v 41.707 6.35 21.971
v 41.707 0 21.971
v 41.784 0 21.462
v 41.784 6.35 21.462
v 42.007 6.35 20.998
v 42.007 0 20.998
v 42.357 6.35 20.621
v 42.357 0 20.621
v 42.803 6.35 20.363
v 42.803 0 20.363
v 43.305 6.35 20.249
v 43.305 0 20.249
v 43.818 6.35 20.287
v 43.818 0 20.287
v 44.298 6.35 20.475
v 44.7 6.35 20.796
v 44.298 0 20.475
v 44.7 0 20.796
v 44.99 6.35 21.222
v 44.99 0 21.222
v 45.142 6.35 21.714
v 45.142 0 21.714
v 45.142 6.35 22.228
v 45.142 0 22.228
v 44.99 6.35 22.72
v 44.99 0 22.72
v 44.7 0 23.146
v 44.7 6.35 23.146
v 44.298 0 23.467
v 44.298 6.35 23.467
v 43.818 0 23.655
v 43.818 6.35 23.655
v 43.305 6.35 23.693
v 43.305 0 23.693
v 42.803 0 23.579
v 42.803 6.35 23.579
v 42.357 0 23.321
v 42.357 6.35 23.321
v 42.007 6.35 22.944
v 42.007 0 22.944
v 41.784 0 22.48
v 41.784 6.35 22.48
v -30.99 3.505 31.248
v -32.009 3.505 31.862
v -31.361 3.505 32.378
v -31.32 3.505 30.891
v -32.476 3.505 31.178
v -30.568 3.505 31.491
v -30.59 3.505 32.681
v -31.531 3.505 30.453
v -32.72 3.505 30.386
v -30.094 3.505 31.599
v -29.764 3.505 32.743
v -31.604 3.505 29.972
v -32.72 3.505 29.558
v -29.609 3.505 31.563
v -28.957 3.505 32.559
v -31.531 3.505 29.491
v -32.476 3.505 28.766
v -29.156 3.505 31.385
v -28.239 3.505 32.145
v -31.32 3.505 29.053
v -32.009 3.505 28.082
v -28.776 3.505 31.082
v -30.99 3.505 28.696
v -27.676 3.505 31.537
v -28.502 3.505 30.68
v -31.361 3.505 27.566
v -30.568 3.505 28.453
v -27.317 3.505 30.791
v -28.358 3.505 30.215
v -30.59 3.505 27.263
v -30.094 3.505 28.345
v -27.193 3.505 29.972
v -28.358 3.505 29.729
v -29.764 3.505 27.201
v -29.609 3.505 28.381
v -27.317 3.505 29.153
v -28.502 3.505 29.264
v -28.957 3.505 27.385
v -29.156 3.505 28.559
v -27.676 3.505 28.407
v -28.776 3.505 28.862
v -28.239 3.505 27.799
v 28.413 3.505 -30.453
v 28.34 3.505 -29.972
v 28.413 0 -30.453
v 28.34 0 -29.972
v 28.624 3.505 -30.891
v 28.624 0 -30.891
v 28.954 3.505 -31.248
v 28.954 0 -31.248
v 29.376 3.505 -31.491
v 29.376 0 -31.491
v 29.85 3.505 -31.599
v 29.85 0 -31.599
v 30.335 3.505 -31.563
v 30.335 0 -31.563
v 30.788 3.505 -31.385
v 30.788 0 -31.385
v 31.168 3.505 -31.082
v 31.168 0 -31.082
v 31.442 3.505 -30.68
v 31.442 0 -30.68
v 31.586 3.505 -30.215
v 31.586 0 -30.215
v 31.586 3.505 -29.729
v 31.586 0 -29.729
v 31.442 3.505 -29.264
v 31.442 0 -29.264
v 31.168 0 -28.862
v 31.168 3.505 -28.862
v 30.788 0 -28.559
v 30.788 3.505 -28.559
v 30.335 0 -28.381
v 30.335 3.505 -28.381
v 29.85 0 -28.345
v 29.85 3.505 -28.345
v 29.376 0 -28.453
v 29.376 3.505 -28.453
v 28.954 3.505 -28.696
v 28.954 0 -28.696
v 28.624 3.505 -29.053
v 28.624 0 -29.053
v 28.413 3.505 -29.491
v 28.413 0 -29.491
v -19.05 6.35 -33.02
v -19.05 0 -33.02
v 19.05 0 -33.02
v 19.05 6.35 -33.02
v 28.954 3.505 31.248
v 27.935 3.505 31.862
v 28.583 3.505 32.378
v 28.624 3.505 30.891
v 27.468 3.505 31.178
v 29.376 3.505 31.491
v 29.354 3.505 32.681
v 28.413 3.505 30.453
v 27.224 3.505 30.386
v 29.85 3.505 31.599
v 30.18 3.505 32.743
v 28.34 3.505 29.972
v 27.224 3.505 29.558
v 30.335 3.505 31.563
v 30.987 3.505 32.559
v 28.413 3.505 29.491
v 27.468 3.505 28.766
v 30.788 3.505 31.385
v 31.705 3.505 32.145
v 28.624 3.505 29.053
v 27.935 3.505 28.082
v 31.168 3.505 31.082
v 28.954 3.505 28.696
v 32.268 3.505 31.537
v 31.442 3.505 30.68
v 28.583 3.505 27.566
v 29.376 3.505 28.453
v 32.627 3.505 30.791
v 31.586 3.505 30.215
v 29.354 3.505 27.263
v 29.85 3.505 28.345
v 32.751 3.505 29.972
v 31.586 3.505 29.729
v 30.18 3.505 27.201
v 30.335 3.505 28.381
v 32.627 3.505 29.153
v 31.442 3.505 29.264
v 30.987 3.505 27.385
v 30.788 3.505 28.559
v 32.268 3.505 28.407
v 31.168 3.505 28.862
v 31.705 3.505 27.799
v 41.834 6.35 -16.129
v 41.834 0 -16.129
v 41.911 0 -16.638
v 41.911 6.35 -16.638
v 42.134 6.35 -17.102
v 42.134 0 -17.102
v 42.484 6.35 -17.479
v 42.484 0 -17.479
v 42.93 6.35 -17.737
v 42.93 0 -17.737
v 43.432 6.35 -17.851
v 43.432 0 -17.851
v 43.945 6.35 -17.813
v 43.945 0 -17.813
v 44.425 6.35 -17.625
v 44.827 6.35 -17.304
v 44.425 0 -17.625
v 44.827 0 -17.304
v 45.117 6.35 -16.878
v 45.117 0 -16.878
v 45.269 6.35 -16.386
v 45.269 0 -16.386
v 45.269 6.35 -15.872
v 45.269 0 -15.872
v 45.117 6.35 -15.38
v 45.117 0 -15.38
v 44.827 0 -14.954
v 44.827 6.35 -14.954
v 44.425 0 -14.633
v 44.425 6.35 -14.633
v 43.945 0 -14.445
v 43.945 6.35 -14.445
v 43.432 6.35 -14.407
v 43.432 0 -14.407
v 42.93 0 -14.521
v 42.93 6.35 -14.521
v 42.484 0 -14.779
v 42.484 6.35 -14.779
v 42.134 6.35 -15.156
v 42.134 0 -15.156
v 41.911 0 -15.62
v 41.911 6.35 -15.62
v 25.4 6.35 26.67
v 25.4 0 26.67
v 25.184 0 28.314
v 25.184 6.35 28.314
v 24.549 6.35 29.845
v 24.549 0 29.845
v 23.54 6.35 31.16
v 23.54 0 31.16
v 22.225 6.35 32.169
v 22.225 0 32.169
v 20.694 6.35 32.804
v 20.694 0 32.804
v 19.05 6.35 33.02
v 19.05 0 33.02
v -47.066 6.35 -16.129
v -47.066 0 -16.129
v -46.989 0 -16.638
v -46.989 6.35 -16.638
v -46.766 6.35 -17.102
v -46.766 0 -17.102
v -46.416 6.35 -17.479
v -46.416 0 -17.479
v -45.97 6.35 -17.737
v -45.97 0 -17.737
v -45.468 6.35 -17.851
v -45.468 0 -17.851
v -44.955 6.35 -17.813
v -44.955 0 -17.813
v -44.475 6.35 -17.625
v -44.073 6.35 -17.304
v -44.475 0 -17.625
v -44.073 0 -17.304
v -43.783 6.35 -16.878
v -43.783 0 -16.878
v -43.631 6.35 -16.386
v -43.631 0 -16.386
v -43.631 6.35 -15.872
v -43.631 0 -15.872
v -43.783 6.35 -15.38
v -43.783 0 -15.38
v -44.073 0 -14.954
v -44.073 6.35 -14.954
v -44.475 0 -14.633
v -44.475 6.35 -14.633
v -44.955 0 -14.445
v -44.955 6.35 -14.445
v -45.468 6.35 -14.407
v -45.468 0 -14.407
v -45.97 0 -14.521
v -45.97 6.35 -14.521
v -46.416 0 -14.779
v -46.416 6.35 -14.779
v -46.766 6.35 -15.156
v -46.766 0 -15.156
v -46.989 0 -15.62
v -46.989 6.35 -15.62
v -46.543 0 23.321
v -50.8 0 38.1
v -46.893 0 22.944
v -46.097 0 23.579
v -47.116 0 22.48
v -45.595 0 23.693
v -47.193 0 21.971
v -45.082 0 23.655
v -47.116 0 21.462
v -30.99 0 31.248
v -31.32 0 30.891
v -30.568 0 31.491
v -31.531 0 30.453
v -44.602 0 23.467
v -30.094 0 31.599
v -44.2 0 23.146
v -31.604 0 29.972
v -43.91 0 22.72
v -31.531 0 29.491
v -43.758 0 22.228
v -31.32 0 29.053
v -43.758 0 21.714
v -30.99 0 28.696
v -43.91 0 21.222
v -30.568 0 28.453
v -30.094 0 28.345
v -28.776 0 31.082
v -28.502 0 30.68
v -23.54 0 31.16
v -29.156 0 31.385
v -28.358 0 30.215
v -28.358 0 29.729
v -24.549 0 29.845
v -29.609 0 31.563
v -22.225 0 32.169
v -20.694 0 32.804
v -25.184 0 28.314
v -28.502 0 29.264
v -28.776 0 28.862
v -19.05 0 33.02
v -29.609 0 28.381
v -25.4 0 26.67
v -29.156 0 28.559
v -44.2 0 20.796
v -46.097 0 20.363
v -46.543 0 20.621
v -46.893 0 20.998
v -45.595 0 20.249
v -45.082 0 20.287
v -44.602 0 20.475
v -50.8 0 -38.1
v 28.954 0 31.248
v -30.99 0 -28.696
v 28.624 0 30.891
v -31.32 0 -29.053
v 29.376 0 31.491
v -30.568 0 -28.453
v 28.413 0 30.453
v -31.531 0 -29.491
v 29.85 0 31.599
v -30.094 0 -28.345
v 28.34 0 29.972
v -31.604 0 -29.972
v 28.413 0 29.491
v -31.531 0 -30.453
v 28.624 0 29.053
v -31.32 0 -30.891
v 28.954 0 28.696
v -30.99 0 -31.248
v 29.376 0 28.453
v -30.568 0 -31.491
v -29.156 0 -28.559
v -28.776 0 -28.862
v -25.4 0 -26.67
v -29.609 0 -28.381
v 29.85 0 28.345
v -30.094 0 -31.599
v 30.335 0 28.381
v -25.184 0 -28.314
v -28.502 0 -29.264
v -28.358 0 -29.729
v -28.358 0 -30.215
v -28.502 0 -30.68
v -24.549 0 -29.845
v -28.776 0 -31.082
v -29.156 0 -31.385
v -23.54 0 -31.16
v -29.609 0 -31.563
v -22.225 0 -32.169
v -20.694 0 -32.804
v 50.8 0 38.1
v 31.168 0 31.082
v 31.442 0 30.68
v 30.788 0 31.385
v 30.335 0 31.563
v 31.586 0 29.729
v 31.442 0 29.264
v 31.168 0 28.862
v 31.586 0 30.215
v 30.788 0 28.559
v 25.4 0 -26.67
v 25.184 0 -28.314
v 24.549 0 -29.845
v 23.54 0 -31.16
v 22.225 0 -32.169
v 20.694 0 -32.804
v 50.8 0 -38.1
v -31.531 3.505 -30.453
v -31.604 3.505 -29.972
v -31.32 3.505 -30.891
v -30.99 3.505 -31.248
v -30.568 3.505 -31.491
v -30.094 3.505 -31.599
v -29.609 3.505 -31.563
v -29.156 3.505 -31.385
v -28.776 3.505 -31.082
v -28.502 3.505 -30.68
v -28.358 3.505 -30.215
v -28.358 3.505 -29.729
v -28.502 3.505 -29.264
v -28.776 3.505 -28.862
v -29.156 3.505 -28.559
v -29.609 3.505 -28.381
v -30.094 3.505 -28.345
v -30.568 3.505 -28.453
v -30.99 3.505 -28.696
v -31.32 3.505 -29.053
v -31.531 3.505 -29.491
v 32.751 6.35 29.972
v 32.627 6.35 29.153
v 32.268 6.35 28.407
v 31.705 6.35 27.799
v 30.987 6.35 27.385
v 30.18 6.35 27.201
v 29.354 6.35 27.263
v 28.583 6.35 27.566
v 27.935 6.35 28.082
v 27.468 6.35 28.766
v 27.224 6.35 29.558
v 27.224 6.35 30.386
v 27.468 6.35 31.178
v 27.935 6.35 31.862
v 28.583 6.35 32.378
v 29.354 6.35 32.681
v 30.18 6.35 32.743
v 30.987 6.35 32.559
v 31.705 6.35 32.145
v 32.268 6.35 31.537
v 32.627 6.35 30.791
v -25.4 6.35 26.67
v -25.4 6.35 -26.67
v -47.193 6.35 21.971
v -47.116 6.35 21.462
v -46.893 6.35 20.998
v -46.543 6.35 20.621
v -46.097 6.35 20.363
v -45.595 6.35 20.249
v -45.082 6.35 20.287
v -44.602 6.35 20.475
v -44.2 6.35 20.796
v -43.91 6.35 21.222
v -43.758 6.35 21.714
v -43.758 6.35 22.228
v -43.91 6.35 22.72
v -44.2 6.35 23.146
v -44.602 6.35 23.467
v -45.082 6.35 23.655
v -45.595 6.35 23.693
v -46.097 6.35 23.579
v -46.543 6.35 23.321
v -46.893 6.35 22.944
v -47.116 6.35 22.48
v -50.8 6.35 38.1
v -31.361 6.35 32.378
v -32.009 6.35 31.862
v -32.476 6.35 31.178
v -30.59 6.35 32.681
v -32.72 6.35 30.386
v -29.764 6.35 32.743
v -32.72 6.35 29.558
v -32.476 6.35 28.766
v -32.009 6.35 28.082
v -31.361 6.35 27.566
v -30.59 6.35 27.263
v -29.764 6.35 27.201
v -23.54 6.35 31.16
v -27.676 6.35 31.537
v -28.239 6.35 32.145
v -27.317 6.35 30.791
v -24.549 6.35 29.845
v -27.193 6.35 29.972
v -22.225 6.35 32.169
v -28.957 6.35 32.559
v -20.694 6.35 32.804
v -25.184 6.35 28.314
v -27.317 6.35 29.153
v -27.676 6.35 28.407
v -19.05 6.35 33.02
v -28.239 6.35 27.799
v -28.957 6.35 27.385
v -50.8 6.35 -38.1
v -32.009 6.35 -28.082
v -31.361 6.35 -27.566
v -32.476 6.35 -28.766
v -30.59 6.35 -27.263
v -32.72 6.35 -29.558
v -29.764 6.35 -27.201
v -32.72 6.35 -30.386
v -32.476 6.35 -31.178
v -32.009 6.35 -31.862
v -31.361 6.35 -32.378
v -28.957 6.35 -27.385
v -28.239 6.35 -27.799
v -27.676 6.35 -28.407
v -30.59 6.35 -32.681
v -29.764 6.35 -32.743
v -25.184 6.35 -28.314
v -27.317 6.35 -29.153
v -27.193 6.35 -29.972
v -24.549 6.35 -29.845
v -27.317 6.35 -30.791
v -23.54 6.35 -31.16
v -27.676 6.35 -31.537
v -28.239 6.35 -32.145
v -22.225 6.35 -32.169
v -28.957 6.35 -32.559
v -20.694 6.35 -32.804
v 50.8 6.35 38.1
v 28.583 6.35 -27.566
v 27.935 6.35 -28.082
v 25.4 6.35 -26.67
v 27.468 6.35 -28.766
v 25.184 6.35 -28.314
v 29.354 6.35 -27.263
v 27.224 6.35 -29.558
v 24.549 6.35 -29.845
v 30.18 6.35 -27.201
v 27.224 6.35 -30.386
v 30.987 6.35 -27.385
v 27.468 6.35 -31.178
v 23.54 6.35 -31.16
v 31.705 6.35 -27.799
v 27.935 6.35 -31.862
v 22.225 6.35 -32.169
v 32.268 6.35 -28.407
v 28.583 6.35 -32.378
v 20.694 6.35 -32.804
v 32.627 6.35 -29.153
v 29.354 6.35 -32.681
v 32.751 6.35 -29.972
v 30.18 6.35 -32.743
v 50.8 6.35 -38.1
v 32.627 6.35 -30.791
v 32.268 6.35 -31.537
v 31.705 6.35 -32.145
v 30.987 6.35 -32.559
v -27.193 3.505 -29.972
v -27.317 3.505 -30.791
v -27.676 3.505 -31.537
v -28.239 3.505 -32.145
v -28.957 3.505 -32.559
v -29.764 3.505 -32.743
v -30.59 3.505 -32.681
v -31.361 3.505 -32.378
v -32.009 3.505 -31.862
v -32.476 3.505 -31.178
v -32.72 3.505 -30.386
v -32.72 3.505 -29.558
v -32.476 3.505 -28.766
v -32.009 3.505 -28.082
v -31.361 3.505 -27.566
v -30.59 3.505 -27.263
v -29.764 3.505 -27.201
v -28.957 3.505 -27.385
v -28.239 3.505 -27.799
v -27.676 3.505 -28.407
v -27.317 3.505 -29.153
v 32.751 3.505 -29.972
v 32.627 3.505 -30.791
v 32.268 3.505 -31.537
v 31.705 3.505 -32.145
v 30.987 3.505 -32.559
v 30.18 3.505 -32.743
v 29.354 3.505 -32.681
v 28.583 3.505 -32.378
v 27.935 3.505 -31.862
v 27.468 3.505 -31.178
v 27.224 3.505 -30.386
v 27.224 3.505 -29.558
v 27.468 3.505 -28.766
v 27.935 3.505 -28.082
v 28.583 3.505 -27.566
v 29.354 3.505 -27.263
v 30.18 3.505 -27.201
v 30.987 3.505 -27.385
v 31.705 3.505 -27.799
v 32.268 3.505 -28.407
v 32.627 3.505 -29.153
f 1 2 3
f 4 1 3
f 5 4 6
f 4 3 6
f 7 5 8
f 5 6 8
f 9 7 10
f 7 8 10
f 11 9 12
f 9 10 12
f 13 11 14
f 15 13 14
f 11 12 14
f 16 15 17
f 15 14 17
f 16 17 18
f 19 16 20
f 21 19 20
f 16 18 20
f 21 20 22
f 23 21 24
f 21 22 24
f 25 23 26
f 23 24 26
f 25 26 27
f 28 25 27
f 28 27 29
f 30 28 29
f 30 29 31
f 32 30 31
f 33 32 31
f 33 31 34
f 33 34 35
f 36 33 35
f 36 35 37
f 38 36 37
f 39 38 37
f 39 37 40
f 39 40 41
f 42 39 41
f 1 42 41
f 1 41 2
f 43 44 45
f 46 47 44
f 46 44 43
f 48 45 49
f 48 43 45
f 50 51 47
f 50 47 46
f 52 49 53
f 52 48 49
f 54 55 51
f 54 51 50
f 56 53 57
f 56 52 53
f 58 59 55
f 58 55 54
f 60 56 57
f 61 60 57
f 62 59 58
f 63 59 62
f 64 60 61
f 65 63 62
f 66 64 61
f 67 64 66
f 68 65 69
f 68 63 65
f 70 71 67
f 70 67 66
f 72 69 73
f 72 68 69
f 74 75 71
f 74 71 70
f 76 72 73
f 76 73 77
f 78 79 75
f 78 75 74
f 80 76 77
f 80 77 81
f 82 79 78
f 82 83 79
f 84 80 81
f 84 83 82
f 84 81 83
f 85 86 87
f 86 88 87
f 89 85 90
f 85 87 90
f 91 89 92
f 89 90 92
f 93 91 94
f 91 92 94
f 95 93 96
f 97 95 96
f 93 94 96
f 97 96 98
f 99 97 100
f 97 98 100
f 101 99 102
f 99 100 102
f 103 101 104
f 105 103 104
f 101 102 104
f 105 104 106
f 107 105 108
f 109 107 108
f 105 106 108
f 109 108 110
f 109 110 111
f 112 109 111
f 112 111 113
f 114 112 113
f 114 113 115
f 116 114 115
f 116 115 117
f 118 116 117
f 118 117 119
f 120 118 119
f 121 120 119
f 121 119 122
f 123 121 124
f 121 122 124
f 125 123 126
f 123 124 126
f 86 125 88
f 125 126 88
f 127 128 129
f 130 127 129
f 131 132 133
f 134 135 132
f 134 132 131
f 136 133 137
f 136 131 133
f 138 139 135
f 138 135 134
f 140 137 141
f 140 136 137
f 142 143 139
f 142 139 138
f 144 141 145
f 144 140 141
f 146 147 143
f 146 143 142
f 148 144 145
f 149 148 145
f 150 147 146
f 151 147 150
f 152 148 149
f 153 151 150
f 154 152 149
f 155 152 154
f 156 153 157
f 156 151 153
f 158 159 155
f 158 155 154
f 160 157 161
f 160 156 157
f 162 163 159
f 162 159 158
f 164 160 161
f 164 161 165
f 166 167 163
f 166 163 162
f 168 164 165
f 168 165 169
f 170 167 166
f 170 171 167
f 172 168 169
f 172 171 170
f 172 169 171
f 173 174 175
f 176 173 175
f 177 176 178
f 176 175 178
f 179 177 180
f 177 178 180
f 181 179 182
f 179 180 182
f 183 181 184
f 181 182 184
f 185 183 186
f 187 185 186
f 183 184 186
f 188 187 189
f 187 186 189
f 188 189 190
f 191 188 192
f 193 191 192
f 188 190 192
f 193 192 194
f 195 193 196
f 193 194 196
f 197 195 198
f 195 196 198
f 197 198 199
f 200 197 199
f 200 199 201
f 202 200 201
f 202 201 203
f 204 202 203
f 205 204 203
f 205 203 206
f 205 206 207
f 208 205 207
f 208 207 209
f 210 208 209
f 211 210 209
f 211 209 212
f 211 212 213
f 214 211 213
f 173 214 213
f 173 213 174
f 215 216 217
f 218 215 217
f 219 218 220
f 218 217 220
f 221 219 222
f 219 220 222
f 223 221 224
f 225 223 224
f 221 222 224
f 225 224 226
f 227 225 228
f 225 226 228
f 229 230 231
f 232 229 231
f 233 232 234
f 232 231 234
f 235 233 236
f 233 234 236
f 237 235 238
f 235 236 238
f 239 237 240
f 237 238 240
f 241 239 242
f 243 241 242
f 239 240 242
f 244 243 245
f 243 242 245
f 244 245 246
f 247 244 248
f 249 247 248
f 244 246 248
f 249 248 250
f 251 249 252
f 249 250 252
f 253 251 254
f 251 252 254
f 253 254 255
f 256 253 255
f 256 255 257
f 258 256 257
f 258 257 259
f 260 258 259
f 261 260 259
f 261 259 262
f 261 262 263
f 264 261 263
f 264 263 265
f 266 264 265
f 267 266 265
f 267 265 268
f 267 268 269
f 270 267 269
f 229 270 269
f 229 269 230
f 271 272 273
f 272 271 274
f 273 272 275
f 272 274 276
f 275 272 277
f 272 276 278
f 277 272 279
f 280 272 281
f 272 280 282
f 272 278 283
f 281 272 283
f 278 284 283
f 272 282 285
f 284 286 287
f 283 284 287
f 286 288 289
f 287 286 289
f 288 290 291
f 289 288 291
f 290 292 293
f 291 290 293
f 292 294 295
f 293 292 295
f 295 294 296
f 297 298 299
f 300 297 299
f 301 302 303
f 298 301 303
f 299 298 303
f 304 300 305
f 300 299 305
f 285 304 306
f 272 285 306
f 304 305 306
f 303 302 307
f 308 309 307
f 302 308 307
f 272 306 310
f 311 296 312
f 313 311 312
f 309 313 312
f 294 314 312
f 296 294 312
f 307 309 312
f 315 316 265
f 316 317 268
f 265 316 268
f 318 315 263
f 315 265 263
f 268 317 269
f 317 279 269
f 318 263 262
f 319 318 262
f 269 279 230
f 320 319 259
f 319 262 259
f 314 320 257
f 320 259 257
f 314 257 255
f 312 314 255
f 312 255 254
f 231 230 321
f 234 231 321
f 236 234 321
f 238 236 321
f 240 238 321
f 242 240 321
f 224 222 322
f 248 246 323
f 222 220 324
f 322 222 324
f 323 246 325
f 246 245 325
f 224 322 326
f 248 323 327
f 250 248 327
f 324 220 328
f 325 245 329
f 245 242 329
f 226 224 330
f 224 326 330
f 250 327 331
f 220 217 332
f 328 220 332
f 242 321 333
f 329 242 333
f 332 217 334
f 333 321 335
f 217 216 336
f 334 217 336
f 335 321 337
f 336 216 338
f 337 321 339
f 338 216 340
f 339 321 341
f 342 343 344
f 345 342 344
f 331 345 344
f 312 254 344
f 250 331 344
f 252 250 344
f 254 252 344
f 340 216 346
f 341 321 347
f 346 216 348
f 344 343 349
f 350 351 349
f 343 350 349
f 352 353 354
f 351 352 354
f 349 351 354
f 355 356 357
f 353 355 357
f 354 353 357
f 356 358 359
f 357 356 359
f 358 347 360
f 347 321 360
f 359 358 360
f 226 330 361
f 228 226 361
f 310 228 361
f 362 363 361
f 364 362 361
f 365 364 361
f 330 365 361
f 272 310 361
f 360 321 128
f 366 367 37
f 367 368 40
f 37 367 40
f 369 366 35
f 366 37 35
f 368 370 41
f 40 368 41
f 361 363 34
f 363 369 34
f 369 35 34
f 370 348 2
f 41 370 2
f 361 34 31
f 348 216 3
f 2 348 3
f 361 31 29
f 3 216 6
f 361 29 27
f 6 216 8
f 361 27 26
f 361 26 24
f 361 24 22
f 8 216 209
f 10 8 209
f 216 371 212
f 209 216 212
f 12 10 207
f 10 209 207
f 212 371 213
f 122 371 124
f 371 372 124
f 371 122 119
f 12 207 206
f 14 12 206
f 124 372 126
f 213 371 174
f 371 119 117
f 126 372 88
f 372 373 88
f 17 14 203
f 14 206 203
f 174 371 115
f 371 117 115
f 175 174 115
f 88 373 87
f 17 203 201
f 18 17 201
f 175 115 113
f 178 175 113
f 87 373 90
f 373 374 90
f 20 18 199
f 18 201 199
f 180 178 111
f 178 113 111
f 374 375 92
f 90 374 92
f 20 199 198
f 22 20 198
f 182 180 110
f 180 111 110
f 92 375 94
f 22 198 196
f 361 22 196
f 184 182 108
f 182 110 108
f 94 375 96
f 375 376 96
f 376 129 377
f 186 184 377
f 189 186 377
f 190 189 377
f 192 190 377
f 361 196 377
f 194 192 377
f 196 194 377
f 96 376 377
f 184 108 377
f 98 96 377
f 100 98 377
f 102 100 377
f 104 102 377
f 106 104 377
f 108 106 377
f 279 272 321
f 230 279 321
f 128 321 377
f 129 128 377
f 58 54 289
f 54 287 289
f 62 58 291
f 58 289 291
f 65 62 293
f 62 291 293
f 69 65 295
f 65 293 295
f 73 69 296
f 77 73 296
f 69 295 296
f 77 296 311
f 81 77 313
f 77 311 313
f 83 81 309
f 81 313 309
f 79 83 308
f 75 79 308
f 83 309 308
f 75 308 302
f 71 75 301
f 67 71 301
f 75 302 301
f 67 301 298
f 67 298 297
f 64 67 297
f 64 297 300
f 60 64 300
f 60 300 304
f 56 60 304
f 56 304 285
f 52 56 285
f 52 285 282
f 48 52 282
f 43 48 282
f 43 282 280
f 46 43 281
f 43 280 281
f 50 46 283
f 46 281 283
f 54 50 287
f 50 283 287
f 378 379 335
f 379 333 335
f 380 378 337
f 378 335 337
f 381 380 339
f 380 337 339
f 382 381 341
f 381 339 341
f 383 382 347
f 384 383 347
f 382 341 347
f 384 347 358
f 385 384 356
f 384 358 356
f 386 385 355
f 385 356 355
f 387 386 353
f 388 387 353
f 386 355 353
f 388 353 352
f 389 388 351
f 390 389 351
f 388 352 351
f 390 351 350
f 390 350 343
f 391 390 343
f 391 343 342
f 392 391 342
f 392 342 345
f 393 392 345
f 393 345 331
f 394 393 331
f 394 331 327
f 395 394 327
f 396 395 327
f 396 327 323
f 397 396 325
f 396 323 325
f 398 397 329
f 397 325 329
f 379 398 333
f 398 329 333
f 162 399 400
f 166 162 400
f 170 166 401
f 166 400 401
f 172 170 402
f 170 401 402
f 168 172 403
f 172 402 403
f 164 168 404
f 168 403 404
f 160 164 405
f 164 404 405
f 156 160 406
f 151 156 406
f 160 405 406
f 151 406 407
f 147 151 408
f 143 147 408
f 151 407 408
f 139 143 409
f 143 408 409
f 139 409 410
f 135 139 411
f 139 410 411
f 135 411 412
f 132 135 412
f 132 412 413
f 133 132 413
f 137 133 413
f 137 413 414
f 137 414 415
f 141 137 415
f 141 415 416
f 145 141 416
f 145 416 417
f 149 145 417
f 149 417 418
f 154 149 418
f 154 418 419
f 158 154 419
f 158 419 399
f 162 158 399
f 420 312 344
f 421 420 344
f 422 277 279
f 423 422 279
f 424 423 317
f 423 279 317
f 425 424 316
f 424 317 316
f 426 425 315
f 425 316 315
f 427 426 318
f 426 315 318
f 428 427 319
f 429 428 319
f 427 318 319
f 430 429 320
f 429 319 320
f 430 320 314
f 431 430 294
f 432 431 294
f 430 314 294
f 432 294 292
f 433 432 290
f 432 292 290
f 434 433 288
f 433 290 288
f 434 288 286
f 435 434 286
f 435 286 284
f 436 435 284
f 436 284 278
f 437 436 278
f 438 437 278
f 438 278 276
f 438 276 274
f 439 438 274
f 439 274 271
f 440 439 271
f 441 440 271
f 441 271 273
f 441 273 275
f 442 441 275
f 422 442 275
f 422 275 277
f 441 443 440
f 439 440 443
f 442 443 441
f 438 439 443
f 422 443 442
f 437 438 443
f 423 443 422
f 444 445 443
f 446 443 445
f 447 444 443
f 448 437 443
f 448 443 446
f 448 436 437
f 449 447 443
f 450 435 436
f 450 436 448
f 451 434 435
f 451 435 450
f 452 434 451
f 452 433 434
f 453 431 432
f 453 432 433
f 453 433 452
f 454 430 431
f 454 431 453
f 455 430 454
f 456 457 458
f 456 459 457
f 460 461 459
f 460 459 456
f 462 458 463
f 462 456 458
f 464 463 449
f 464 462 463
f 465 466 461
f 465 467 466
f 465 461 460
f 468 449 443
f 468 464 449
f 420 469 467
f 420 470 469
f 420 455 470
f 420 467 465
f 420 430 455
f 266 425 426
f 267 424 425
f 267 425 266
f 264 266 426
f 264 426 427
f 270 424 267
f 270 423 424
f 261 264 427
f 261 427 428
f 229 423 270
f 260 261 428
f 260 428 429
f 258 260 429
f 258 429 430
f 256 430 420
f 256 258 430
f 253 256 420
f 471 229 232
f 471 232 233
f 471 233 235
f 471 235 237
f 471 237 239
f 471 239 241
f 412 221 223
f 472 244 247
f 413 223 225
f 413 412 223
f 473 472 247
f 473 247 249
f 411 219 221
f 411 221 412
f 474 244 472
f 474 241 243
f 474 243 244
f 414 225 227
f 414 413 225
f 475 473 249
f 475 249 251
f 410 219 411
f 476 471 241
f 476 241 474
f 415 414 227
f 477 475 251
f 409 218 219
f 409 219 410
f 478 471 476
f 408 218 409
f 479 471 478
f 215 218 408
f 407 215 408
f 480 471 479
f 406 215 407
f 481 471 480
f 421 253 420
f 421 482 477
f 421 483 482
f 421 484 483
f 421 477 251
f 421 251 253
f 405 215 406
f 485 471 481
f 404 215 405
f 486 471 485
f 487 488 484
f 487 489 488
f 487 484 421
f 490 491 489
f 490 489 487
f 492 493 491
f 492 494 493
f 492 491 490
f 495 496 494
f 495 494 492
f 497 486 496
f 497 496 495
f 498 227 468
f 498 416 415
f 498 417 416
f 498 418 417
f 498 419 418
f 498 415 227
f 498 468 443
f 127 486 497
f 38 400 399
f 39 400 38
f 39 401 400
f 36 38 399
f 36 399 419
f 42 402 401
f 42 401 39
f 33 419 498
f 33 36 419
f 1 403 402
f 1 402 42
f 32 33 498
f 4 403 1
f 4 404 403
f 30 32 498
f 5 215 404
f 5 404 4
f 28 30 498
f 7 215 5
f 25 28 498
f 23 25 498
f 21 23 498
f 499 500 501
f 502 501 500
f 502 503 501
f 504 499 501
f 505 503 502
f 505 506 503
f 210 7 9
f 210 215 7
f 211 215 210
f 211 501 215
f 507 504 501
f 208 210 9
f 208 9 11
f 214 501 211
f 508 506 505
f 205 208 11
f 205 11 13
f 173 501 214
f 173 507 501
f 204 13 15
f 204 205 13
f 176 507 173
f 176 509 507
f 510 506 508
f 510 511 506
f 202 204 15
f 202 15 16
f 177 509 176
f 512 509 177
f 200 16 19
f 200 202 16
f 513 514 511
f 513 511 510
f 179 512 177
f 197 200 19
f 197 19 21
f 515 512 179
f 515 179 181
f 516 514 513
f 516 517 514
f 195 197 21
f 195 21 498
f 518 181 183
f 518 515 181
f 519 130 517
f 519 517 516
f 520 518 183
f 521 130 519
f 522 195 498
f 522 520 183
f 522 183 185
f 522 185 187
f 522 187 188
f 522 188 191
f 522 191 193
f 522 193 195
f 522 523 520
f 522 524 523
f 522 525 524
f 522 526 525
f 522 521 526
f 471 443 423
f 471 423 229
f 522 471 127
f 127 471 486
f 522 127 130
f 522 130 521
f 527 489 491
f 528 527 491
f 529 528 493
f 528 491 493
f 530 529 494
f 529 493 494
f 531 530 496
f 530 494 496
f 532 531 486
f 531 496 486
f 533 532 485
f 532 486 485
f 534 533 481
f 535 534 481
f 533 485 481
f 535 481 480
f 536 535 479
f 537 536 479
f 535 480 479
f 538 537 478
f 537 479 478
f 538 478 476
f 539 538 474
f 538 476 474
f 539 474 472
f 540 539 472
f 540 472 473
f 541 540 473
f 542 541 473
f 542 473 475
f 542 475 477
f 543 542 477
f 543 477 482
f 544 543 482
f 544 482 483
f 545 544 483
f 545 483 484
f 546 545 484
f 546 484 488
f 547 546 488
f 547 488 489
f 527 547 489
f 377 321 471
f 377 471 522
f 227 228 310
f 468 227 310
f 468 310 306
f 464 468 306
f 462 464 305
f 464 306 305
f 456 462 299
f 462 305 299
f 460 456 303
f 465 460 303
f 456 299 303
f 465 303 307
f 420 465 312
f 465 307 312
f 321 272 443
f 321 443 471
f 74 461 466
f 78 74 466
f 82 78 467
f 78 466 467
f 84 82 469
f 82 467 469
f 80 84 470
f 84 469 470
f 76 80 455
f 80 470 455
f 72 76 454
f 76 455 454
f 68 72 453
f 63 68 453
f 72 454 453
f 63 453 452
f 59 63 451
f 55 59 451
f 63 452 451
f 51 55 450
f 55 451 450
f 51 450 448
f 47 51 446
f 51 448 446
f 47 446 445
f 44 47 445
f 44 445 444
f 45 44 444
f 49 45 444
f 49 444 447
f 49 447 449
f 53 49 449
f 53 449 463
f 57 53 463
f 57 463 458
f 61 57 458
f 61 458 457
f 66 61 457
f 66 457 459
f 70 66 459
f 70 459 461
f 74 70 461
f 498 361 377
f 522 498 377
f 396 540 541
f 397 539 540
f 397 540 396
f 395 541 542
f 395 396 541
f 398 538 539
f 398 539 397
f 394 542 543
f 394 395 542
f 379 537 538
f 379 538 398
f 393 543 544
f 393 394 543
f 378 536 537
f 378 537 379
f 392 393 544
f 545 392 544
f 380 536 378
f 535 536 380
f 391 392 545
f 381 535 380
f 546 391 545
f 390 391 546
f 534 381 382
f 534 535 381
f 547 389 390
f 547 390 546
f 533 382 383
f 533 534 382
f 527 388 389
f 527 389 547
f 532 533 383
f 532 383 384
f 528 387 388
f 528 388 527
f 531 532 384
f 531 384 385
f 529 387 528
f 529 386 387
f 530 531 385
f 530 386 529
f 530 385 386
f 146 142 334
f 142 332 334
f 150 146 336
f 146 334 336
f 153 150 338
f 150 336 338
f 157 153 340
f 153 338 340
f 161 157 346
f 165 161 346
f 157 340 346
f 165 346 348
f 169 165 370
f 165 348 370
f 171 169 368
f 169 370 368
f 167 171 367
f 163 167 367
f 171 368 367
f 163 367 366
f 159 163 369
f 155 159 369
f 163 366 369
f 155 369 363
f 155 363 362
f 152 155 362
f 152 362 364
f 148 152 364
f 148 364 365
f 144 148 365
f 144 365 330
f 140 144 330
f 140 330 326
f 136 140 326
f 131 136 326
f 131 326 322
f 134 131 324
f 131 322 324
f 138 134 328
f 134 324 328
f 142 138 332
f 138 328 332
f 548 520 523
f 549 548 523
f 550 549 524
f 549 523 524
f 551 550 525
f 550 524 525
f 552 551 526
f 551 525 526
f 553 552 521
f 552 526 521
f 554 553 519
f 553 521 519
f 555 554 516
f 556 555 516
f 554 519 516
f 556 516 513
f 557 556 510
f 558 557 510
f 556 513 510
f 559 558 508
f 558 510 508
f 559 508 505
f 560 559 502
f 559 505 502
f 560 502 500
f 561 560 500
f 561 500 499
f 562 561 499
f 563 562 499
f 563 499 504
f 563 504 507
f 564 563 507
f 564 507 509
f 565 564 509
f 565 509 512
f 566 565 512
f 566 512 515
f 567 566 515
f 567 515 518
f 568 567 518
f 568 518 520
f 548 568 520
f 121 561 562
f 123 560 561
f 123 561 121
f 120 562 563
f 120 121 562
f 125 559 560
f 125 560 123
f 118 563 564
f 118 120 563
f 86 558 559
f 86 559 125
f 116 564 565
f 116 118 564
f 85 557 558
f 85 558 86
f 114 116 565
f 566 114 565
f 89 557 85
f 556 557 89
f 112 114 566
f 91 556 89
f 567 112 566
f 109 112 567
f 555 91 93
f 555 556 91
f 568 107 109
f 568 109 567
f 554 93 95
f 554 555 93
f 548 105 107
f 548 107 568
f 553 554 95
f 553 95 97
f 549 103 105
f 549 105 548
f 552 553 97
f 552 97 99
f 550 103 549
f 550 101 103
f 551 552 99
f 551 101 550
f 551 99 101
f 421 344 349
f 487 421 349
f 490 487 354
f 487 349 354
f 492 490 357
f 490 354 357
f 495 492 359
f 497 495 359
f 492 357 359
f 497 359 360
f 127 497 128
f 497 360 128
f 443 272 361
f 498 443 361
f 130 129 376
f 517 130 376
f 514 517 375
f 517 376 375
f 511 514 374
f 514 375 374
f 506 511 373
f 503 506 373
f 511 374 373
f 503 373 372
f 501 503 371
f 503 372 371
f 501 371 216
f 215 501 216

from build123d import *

# Parameters (mm, degrees)
SKETCH2_W                                      = 101.6
SKETCH2_H                                      = 76.2
BOSS_EXTRUDE1_DEPTH                            = 6.35
CBORE_FOR_4_SOCKET_HEAD_CAP_SCREW1_D           = 3.2639
CBORE_FOR_4_SOCKET_HEAD_CAP_SCREW1_CBORE_D     = 5.55752
CBORE_FOR_4_SOCKET_HEAD_CAP_SCREW1_CBORE_DEPTH = 2.8448
F_8_32_TAPPED_HOLE1_D                          = 3.4544


with BuildPart() as part:
    # Sketch2 → Boss-Extrude1 (new body)
    with BuildSketch(Plane(origin=(0, 0, 0), x_dir=(1, 0, 0), z_dir=(0, 1, 0))):
        Rectangle(SKETCH2_W, SKETCH2_H)
        with BuildLine():
            Line((-19.05, 33.02), (19.05, 33.02))
            ThreePointArc((19.05, 33.02), (23.540128061, 31.160128061), (25.4, 26.67))
            Line((25.4, 26.67), (25.4, -26.67))
            ThreePointArc((25.4, -26.67), (23.540128061, -31.160128061), (19.05, -33.02))
            Line((19.05, -33.02), (-19.05, -33.02))
            ThreePointArc((-19.05, -33.02), (-23.540128061, -31.160128061), (-25.4, -26.67))
            Line((-25.4, -26.67), (-25.4, 26.67))
            ThreePointArc((-25.4, 26.67), (-23.540128061, 31.160128061), (-19.05, 33.02))
        make_face(mode=Mode.SUBTRACT)
    extrude(amount=BOSS_EXTRUDE1_DEPTH)

    # CBORE for #4 Socket Head Cap Screw1 (through all)
    with Locations(Plane(origin=(0, 6.35, 0), x_dir=(1, 0, 0), z_dir=(0, 1, 0))):
        with Locations((-29.972, 29.972), (29.972, 29.972), (29.972, -29.972), (-29.972, -29.972)):
            CounterBoreHole(CBORE_FOR_4_SOCKET_HEAD_CAP_SCREW1_D / 2, CBORE_FOR_4_SOCKET_HEAD_CAP_SCREW1_CBORE_D / 2, CBORE_FOR_4_SOCKET_HEAD_CAP_SCREW1_CBORE_DEPTH)

    # #8-32 Tapped Hole1 (through all)
    with Locations(Plane(origin=(0, 6.35, 0), x_dir=(1, 0, 0), z_dir=(0, 1, 0))):
        with Locations((-45.339, 16.129), (-45.466, -21.971), (43.561, 16.129), (43.434, -21.971)):
            Hole(F_8_32_TAPPED_HOLE1_D / 2)


solid = part.part
